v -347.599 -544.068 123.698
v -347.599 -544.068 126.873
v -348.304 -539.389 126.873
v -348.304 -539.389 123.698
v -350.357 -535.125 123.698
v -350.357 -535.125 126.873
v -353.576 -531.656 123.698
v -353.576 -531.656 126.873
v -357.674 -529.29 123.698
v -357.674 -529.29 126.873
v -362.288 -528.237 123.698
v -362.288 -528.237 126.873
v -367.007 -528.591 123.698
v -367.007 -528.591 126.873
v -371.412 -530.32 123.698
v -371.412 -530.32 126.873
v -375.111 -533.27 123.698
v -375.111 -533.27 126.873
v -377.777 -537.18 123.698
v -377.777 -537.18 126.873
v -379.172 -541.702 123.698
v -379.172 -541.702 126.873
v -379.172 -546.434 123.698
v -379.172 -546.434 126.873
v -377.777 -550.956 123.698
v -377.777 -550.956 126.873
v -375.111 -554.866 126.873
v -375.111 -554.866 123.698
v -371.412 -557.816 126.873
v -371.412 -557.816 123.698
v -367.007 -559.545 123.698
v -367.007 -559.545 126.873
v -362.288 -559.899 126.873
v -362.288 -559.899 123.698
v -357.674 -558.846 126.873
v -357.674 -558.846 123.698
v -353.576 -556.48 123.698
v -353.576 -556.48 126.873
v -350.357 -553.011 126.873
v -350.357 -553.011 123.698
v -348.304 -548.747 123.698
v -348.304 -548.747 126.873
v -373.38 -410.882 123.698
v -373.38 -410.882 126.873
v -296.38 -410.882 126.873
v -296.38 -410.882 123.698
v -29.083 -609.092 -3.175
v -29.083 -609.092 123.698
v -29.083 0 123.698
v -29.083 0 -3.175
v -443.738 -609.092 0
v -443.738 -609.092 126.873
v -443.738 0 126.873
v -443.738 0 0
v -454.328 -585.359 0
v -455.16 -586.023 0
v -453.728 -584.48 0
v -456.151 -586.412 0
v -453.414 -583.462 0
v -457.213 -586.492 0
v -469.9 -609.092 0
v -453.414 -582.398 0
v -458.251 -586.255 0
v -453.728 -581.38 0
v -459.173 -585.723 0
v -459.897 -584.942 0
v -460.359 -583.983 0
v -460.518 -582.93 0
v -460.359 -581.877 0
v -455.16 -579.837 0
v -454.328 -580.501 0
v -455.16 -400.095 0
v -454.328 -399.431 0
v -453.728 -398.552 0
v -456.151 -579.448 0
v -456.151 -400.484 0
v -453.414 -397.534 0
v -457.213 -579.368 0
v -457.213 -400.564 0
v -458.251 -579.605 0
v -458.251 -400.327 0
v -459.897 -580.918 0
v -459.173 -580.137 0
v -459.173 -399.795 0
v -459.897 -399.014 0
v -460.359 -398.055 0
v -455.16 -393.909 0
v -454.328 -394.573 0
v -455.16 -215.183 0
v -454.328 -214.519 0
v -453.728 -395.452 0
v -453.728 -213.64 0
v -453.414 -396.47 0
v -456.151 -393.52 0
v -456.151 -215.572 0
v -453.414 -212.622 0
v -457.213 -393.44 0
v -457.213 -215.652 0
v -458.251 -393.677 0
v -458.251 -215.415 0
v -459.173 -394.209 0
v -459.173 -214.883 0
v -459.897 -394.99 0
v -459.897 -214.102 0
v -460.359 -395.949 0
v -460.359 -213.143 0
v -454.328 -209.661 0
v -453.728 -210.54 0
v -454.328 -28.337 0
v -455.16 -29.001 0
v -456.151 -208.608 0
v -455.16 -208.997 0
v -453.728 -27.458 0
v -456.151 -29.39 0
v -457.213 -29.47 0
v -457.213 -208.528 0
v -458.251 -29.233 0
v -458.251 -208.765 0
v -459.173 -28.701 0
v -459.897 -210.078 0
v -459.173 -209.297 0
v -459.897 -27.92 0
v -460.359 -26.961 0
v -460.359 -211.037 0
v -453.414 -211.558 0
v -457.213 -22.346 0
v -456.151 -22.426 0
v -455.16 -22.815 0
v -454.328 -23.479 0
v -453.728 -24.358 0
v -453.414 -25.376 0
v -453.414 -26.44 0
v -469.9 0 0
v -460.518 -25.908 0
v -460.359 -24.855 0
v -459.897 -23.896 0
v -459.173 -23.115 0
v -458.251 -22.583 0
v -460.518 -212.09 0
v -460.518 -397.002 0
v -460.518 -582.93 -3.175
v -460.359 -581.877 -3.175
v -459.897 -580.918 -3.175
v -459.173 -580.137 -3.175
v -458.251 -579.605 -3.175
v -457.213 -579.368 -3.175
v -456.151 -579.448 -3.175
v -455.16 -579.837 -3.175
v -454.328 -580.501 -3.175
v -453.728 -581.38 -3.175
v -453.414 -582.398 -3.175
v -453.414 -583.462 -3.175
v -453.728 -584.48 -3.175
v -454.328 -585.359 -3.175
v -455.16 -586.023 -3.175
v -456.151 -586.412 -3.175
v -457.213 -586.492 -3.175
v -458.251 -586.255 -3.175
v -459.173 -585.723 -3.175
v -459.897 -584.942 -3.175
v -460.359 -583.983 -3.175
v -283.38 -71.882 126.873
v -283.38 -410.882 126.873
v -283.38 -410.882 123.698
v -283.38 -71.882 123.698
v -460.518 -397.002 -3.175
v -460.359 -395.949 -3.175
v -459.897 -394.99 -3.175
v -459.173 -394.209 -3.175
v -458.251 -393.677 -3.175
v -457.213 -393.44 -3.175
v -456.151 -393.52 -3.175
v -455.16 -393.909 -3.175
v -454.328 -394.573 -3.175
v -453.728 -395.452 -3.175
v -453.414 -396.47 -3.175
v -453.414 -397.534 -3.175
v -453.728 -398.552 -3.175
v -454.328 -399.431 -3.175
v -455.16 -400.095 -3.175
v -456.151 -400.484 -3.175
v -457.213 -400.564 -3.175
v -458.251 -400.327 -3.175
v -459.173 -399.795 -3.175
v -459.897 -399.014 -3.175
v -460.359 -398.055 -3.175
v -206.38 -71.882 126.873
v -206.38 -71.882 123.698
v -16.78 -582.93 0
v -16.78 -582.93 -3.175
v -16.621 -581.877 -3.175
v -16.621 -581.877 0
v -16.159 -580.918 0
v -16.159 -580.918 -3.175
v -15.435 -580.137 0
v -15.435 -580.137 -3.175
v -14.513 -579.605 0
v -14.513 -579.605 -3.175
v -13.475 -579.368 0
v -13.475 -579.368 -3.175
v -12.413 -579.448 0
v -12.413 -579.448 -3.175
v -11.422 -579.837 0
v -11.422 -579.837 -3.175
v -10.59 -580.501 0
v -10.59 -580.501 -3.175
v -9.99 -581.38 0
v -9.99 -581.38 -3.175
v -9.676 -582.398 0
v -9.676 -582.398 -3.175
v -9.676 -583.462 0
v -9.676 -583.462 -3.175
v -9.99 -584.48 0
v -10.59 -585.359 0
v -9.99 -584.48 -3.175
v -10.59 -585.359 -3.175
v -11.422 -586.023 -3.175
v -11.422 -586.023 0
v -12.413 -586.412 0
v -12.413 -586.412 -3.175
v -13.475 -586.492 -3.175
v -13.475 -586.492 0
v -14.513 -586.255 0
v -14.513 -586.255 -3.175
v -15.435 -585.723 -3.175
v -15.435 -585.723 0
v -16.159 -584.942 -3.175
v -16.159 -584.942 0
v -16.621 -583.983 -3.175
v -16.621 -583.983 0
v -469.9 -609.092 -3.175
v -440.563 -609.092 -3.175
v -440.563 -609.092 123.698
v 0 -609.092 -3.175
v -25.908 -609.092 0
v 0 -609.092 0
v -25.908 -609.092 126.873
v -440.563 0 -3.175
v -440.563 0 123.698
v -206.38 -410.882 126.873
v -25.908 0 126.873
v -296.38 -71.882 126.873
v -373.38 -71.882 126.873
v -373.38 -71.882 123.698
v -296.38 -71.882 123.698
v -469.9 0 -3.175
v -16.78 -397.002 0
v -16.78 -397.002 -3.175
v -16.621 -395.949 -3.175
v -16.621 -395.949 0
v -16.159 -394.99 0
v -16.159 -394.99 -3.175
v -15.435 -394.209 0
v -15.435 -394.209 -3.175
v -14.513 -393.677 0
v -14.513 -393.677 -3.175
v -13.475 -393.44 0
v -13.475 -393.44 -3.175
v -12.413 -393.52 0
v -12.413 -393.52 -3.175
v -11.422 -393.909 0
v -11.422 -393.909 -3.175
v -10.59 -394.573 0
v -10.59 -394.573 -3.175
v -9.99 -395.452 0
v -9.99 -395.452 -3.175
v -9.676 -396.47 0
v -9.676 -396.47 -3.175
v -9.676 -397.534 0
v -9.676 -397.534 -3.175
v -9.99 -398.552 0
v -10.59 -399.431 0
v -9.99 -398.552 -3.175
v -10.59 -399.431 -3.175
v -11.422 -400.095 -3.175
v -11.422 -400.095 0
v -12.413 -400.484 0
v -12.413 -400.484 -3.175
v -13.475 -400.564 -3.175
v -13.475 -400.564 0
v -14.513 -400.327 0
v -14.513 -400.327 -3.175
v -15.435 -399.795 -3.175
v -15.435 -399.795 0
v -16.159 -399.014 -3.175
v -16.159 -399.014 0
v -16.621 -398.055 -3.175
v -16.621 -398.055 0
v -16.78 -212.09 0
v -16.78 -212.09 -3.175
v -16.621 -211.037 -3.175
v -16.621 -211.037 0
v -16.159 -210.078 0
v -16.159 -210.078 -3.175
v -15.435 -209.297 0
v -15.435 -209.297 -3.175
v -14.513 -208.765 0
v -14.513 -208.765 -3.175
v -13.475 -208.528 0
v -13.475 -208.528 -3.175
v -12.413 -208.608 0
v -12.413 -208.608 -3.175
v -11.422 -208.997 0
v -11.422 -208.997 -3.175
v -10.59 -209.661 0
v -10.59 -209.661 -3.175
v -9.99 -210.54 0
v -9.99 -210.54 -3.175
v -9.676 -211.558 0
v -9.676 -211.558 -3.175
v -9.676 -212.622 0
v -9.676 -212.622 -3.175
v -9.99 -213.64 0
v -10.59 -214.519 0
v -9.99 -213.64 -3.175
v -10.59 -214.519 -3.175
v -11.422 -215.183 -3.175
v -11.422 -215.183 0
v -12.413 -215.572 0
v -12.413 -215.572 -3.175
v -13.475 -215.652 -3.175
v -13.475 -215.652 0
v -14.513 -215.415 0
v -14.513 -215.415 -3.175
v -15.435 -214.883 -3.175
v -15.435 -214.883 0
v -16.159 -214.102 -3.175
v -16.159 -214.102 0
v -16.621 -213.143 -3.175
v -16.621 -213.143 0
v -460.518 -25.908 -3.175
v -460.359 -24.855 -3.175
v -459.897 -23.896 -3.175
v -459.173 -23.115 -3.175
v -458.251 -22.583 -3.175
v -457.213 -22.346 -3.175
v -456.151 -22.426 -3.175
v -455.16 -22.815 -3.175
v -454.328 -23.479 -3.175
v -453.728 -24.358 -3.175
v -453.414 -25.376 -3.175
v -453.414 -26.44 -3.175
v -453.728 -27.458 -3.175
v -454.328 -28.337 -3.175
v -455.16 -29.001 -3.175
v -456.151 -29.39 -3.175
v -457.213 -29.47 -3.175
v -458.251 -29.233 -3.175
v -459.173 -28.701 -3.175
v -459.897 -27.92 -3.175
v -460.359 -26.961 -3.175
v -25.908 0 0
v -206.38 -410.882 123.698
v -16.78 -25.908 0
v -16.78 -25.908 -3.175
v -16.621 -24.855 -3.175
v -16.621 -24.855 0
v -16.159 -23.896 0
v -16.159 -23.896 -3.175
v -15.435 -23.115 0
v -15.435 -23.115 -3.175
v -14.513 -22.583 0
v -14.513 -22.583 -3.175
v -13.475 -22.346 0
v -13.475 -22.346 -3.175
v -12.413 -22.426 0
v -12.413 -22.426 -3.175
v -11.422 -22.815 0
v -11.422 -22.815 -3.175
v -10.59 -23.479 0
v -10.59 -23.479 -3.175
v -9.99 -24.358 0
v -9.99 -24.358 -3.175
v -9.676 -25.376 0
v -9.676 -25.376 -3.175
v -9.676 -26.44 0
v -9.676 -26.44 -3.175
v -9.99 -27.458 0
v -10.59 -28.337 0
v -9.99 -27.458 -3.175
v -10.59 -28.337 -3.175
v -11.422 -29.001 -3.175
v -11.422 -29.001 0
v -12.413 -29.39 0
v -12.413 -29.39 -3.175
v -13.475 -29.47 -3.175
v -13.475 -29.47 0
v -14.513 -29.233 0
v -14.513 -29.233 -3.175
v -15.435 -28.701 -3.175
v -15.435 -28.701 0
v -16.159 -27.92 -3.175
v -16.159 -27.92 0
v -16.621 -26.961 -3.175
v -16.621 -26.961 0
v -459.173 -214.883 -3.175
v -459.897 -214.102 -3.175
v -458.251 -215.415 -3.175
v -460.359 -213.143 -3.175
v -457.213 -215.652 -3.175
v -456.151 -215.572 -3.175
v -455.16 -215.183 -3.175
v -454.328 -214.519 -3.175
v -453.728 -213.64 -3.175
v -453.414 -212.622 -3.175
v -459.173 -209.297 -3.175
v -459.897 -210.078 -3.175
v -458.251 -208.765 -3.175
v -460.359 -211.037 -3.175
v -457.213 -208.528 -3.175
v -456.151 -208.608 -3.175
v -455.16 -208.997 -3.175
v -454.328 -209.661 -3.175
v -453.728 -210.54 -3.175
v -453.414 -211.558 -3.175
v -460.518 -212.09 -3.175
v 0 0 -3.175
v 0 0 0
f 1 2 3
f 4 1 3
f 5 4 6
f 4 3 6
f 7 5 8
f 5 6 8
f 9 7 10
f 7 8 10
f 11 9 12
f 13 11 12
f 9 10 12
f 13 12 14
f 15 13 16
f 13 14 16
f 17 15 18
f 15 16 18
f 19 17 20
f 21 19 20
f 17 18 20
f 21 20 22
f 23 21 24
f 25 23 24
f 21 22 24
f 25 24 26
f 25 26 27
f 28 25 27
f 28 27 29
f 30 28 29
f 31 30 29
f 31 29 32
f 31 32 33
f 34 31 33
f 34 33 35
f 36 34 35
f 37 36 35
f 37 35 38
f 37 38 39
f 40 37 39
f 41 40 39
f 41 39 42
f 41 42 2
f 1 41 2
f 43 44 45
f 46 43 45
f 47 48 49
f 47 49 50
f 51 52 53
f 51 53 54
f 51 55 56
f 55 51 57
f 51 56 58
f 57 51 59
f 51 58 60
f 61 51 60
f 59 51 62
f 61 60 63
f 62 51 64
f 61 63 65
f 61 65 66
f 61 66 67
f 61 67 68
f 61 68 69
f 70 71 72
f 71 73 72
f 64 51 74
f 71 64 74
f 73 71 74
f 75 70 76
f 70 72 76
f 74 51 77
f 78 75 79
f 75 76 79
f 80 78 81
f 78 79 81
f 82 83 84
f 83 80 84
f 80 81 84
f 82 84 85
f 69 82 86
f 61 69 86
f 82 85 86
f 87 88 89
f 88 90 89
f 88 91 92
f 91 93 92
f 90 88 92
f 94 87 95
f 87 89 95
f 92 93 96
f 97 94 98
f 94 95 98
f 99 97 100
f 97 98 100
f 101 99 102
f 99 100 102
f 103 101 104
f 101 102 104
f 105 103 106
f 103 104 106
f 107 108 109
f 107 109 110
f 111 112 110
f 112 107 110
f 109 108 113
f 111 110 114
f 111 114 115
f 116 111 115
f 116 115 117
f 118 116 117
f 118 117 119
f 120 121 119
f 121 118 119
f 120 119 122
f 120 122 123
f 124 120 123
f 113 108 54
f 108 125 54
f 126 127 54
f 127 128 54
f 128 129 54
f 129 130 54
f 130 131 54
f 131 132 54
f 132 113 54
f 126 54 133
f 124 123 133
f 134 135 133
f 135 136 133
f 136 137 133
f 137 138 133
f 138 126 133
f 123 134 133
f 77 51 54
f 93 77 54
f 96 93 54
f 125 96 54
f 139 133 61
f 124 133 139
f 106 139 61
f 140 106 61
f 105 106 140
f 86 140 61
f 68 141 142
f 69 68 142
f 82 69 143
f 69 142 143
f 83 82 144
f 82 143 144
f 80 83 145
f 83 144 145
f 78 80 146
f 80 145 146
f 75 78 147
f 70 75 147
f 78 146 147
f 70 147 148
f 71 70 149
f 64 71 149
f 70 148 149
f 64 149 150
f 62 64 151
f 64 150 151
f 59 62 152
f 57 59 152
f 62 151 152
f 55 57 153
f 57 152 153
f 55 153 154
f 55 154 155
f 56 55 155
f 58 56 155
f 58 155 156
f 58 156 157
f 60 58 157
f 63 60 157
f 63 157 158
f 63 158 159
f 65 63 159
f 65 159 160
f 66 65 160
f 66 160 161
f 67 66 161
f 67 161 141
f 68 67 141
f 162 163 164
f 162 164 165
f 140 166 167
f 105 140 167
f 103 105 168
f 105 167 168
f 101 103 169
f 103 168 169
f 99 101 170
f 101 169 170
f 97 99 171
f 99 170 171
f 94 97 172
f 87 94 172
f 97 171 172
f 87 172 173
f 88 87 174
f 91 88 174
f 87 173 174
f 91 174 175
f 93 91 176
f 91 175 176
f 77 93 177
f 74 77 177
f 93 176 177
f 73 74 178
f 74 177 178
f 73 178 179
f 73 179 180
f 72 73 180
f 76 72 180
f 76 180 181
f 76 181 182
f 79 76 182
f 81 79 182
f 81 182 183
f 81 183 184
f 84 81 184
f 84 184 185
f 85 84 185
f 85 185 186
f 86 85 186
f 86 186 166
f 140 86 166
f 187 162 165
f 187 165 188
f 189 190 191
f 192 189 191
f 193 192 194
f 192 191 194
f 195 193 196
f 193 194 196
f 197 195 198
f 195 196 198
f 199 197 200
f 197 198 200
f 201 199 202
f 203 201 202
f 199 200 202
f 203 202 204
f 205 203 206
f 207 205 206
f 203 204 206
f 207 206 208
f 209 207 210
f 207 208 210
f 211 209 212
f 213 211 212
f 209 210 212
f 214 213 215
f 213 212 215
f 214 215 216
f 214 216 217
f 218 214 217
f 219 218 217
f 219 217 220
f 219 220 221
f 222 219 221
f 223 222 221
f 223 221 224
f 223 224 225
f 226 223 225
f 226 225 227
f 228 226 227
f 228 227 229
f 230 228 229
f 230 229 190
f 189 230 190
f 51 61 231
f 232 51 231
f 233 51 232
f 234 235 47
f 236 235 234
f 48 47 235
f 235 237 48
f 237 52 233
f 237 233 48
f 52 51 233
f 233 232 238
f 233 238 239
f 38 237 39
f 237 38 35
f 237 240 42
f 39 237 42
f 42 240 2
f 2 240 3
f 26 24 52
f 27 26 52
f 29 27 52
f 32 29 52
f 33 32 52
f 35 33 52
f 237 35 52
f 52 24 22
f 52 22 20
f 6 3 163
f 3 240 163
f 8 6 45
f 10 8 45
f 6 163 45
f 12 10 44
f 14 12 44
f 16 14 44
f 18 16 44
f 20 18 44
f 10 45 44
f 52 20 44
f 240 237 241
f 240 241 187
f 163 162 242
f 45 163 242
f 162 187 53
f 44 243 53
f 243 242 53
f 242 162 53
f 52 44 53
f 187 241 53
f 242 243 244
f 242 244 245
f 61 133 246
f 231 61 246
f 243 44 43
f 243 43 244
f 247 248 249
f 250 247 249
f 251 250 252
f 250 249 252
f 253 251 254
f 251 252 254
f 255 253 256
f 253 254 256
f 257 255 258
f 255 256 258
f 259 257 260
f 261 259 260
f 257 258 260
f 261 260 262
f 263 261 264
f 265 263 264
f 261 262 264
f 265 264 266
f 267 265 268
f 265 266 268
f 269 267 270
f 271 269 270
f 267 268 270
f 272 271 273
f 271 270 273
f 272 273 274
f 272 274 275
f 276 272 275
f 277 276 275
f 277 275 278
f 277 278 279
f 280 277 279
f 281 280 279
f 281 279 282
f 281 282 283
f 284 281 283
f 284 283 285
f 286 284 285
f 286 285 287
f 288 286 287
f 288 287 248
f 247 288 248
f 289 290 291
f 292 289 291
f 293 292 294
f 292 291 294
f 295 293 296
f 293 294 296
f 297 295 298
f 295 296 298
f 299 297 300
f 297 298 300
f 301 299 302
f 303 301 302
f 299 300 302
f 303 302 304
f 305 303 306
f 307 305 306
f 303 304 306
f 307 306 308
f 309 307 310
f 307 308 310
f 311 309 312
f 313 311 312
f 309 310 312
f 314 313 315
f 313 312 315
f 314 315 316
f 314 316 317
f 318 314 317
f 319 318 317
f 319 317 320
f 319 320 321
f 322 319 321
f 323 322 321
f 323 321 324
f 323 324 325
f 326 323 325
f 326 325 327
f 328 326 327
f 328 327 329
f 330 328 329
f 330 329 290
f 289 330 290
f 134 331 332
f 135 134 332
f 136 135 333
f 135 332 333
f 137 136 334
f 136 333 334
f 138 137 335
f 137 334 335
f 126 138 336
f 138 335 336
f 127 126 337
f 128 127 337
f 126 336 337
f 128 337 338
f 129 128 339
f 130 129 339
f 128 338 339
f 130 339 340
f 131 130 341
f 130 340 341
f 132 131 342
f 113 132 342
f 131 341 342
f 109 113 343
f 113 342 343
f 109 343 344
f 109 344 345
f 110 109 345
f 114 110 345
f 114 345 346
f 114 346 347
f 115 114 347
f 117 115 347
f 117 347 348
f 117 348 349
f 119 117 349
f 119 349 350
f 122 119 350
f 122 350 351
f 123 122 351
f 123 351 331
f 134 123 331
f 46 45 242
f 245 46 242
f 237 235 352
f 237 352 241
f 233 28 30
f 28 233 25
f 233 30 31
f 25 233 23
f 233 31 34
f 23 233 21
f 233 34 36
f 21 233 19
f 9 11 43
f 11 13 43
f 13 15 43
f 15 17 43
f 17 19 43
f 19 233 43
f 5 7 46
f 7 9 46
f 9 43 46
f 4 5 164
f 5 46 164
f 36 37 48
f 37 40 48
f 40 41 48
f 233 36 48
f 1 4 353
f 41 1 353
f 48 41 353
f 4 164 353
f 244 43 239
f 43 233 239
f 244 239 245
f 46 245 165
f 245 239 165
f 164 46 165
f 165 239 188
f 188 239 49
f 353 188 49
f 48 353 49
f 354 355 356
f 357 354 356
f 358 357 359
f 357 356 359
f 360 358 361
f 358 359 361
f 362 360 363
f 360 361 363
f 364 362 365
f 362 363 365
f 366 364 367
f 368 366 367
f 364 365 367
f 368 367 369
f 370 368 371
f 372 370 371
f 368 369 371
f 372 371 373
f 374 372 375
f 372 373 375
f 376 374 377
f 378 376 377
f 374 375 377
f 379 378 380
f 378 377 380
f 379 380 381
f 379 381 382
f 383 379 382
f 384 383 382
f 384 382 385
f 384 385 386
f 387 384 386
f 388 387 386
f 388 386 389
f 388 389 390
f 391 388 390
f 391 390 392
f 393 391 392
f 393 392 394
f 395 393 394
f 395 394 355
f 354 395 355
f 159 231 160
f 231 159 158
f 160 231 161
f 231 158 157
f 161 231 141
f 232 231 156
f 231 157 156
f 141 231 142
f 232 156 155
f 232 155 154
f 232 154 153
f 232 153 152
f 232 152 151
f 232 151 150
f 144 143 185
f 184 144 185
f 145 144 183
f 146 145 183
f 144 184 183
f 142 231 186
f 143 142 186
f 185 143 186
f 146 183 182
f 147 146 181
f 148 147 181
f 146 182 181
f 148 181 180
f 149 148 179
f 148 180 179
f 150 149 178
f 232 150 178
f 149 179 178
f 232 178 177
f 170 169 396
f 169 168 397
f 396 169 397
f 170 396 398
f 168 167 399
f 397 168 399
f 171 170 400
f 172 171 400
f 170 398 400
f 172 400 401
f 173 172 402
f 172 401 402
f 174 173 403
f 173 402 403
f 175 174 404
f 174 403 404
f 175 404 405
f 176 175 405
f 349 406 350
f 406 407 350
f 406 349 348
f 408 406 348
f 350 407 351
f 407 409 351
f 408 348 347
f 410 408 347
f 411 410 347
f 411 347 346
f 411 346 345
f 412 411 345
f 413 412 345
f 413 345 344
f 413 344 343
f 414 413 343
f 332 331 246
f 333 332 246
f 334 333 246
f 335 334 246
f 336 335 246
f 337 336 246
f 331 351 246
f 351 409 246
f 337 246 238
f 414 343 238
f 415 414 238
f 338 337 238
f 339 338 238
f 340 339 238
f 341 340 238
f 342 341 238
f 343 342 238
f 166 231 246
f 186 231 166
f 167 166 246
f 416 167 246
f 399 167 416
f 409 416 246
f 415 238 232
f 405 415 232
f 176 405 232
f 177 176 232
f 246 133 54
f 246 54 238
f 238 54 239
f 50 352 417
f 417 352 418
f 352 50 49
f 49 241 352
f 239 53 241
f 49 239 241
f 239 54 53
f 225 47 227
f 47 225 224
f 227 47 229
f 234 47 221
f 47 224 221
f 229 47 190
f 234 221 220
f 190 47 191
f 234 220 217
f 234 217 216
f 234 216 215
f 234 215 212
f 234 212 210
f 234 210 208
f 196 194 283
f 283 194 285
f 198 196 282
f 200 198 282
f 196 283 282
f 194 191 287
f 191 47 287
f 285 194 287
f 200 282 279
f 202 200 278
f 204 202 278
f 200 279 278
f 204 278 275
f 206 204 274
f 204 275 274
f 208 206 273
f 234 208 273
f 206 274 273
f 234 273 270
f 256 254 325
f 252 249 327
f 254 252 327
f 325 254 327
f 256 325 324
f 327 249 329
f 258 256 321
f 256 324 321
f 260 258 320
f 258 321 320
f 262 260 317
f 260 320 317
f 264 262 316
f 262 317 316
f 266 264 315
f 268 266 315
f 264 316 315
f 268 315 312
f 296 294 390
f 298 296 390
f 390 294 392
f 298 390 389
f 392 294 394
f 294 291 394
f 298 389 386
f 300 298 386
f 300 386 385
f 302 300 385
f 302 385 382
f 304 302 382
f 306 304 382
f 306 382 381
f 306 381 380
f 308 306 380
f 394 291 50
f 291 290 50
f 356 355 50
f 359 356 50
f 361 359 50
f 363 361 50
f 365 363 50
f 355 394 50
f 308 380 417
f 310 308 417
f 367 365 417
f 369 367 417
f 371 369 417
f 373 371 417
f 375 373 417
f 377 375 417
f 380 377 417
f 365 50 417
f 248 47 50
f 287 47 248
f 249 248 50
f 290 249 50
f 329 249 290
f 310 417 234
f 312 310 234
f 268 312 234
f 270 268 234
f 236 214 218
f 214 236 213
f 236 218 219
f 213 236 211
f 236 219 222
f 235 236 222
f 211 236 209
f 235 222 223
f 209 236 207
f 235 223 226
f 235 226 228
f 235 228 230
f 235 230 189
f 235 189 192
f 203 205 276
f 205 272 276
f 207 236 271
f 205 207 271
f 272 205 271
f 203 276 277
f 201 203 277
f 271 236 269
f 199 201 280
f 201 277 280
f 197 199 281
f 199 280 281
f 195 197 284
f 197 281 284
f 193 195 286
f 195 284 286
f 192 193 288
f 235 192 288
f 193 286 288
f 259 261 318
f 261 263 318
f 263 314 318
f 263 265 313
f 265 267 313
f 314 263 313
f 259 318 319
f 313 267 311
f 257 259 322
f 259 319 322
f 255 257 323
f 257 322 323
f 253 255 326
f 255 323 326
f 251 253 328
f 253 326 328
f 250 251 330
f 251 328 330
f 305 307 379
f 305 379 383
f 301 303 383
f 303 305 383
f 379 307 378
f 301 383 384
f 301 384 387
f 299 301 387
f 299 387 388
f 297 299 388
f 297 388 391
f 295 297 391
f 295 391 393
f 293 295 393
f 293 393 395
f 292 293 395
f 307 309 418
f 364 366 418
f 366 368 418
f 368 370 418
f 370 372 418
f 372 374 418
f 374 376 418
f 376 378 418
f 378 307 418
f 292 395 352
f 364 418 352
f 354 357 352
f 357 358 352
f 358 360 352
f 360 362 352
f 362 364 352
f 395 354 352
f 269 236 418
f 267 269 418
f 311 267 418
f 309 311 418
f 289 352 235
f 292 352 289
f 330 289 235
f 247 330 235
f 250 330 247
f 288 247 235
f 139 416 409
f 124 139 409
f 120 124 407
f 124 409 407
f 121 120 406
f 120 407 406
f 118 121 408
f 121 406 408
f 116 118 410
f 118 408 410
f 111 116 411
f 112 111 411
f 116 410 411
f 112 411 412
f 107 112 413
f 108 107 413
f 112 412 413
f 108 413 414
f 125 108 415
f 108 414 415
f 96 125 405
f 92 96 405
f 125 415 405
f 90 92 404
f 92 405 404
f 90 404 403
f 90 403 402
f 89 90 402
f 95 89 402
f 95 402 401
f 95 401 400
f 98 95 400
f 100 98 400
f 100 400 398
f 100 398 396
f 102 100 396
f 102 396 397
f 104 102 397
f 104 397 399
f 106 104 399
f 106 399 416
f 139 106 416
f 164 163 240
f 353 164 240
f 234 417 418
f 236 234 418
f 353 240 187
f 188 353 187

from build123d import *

# Parameters (mm, degrees)
F1_DEPTH = 609.092
F2_W     = 77
F2_H     = 339
F3_DEPTH = 25.4
F4_R     = 15.875
F5_DEPTH = 25.4
F7_D     = 7.14375


# Not quite as in the source:
# - a length typed as a fraction of an inch, garbled in the dataset ("3 / 203.2 mm" for 3/8 in), is restored


with BuildPart() as f1:
    # F0 (on Front) → F1 (new body)
    with BuildSketch(Plane.XZ):
        Polygon((0, -3.175), (0, 0), (-25.908, 0), (-25.908, 126.873), (-443.738, 126.873), (-443.738, 0), (-469.9, 0), (-469.9, -3.175), (-440.563, -3.175), (-440.563, 123.698), (-29.083, 123.698), (-29.083, -3.175), align=None)
    extrude(amount=F1_DEPTH)

    # F2 (on face) → F3 (cut)
    with BuildSketch(Plane.XY.offset(126.873)):
        with Locations((-334.88, -241.382)):
            Rectangle(F2_W, F2_H)
        with Locations((-244.88, -241.382)):
            Rectangle(F2_W, F2_H)
    extrude(amount=-F3_DEPTH, mode=Mode.SUBTRACT)

    # F4 (on face) → F5 (cut)
    with BuildSketch(Plane.XY.offset(126.873)):
        with Locations((-363.474, -544.068)):
            Circle(F4_R)
    extrude(amount=-F5_DEPTH, mode=Mode.SUBTRACT)

    # F7 (through all)
    with Locations(Plane.XY):
        with Locations((-456.946, -25.908), (-456.946, -212.09), (-456.946, -397.002), (-456.946, -582.93), (-13.208, -582.93), (-13.208, -397.002), (-13.208, -212.09), (-13.208, -25.908)):
            Hole(F7_D / 2)


solid = f1.part
